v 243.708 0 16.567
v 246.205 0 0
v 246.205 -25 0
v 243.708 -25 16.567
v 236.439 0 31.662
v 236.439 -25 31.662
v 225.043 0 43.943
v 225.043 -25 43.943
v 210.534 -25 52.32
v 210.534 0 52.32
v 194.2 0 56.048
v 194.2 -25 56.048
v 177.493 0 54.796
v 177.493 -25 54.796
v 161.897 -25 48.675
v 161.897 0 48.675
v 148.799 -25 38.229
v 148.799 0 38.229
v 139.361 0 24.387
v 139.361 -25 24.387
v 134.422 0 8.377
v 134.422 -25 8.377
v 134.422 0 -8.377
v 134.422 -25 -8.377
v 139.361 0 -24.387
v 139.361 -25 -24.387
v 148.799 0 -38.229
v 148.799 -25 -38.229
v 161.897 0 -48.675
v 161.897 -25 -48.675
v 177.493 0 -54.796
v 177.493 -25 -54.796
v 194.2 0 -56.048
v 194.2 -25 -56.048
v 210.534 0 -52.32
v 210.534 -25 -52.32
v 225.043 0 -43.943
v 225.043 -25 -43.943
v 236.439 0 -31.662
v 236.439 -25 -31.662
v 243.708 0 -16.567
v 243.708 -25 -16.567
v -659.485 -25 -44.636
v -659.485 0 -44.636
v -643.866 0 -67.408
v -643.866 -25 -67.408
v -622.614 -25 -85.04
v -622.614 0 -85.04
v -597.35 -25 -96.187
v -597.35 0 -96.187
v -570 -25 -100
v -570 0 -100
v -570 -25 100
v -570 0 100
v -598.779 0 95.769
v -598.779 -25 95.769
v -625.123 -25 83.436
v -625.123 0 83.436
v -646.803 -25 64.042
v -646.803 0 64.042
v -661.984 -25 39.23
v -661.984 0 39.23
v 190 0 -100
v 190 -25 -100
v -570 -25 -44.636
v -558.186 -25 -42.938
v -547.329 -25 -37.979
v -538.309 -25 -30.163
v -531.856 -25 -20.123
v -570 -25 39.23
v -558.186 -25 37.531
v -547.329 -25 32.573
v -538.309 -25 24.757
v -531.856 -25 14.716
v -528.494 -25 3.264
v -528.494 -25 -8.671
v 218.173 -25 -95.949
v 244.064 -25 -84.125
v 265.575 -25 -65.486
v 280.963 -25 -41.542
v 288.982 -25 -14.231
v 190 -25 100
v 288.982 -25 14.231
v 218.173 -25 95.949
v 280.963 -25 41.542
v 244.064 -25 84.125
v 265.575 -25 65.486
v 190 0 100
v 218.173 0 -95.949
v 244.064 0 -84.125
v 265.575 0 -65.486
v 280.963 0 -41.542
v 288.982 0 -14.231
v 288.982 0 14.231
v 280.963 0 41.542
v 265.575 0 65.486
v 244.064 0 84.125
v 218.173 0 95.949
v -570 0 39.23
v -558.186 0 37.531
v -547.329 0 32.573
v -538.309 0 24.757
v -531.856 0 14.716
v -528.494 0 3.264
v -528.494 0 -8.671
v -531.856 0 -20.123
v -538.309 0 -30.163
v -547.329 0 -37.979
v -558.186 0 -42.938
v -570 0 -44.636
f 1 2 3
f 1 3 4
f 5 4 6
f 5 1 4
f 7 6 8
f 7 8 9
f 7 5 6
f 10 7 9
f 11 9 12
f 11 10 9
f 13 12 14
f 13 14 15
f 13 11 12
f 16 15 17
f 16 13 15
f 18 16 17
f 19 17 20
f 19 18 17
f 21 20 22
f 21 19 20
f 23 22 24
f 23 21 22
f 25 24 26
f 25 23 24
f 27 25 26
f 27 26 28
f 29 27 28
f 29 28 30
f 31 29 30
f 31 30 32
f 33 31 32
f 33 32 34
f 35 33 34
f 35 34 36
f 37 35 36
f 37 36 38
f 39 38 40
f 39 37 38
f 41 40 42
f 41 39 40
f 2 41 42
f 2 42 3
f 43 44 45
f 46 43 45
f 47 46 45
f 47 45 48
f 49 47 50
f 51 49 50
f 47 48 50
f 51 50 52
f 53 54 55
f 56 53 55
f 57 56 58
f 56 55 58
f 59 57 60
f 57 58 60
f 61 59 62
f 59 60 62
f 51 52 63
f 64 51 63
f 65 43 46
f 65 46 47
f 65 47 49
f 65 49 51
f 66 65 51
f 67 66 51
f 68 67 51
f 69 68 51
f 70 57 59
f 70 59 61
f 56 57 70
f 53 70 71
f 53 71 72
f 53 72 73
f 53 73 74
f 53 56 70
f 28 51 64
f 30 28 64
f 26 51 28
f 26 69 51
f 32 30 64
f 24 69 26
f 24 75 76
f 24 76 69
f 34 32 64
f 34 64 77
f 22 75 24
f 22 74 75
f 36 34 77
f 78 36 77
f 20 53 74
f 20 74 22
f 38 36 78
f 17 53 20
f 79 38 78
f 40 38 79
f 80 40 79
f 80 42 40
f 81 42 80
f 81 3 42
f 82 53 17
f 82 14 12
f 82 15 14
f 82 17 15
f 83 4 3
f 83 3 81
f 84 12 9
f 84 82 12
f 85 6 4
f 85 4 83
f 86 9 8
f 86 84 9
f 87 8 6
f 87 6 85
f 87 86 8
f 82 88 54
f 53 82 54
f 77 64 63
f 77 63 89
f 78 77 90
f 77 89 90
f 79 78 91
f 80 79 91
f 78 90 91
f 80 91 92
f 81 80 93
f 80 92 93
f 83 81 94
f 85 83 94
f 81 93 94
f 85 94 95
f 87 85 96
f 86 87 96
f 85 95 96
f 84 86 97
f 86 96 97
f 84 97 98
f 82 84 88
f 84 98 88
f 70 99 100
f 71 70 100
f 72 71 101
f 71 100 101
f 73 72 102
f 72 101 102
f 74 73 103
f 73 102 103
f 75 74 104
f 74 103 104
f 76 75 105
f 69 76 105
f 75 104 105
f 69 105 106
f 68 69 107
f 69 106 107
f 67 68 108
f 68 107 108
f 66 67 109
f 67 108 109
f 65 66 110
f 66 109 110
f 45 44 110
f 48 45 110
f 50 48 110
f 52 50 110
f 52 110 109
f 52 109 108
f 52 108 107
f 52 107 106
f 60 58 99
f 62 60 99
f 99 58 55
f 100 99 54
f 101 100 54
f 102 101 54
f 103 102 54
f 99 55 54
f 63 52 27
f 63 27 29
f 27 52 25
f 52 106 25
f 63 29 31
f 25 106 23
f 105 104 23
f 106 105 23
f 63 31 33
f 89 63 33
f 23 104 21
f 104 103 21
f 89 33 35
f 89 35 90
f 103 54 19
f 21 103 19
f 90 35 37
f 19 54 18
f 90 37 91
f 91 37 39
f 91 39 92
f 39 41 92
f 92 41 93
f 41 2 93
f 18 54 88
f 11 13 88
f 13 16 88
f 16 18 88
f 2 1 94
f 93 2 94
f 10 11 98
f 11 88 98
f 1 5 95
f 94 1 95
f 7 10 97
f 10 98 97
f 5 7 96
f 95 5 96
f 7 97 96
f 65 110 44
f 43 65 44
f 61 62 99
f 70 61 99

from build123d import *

# Parameters (mm, degrees)
F0_R     = 56.205306
F1_DEPTH = 25


with BuildPart() as f1:
    # F0 (on Front) → F1 (new body)
    with BuildSketch(Plane.XZ):
        with BuildLine():
            Line((190, 100), (-190, 100))
            Line((-190, 100), (-570, 100))
            Line((-570, 100), (-570, 39.229718))
            ThreePointArc((-570, 39.229718), (-528.067085, -2.703197), (-570, -44.636112))
            Line((-570, -44.636112), (-570, -100))
            Line((-570, -100), (-190, -100))
            Line((-190, -100), (190, -100))
            ThreePointArc((190, -100), (290, 0), (190, 100))
        make_face()
        with Locations((190, 0)):
            Circle(F0_R, mode=Mode.SUBTRACT)
        with BuildLine():
            Line((-570, 39.229718), (-570, 100))
            ThreePointArc((-570, 100), (-625.122719, 83.435519), (-661.983853, 39.229718))
            Line((-661.983853, 39.229718), (-570, 39.229718))
        make_face()
        with BuildLine():
            Line((-570, -100), (-570, -44.636112))
            Line((-570, -44.636112), (-659.485292, -44.636112))
            ThreePointArc((-659.485292, -44.636112), (-622.613633, -85.040023), (-570, -100))
        make_face()
    extrude(amount=F1_DEPTH)


solid = f1.part
